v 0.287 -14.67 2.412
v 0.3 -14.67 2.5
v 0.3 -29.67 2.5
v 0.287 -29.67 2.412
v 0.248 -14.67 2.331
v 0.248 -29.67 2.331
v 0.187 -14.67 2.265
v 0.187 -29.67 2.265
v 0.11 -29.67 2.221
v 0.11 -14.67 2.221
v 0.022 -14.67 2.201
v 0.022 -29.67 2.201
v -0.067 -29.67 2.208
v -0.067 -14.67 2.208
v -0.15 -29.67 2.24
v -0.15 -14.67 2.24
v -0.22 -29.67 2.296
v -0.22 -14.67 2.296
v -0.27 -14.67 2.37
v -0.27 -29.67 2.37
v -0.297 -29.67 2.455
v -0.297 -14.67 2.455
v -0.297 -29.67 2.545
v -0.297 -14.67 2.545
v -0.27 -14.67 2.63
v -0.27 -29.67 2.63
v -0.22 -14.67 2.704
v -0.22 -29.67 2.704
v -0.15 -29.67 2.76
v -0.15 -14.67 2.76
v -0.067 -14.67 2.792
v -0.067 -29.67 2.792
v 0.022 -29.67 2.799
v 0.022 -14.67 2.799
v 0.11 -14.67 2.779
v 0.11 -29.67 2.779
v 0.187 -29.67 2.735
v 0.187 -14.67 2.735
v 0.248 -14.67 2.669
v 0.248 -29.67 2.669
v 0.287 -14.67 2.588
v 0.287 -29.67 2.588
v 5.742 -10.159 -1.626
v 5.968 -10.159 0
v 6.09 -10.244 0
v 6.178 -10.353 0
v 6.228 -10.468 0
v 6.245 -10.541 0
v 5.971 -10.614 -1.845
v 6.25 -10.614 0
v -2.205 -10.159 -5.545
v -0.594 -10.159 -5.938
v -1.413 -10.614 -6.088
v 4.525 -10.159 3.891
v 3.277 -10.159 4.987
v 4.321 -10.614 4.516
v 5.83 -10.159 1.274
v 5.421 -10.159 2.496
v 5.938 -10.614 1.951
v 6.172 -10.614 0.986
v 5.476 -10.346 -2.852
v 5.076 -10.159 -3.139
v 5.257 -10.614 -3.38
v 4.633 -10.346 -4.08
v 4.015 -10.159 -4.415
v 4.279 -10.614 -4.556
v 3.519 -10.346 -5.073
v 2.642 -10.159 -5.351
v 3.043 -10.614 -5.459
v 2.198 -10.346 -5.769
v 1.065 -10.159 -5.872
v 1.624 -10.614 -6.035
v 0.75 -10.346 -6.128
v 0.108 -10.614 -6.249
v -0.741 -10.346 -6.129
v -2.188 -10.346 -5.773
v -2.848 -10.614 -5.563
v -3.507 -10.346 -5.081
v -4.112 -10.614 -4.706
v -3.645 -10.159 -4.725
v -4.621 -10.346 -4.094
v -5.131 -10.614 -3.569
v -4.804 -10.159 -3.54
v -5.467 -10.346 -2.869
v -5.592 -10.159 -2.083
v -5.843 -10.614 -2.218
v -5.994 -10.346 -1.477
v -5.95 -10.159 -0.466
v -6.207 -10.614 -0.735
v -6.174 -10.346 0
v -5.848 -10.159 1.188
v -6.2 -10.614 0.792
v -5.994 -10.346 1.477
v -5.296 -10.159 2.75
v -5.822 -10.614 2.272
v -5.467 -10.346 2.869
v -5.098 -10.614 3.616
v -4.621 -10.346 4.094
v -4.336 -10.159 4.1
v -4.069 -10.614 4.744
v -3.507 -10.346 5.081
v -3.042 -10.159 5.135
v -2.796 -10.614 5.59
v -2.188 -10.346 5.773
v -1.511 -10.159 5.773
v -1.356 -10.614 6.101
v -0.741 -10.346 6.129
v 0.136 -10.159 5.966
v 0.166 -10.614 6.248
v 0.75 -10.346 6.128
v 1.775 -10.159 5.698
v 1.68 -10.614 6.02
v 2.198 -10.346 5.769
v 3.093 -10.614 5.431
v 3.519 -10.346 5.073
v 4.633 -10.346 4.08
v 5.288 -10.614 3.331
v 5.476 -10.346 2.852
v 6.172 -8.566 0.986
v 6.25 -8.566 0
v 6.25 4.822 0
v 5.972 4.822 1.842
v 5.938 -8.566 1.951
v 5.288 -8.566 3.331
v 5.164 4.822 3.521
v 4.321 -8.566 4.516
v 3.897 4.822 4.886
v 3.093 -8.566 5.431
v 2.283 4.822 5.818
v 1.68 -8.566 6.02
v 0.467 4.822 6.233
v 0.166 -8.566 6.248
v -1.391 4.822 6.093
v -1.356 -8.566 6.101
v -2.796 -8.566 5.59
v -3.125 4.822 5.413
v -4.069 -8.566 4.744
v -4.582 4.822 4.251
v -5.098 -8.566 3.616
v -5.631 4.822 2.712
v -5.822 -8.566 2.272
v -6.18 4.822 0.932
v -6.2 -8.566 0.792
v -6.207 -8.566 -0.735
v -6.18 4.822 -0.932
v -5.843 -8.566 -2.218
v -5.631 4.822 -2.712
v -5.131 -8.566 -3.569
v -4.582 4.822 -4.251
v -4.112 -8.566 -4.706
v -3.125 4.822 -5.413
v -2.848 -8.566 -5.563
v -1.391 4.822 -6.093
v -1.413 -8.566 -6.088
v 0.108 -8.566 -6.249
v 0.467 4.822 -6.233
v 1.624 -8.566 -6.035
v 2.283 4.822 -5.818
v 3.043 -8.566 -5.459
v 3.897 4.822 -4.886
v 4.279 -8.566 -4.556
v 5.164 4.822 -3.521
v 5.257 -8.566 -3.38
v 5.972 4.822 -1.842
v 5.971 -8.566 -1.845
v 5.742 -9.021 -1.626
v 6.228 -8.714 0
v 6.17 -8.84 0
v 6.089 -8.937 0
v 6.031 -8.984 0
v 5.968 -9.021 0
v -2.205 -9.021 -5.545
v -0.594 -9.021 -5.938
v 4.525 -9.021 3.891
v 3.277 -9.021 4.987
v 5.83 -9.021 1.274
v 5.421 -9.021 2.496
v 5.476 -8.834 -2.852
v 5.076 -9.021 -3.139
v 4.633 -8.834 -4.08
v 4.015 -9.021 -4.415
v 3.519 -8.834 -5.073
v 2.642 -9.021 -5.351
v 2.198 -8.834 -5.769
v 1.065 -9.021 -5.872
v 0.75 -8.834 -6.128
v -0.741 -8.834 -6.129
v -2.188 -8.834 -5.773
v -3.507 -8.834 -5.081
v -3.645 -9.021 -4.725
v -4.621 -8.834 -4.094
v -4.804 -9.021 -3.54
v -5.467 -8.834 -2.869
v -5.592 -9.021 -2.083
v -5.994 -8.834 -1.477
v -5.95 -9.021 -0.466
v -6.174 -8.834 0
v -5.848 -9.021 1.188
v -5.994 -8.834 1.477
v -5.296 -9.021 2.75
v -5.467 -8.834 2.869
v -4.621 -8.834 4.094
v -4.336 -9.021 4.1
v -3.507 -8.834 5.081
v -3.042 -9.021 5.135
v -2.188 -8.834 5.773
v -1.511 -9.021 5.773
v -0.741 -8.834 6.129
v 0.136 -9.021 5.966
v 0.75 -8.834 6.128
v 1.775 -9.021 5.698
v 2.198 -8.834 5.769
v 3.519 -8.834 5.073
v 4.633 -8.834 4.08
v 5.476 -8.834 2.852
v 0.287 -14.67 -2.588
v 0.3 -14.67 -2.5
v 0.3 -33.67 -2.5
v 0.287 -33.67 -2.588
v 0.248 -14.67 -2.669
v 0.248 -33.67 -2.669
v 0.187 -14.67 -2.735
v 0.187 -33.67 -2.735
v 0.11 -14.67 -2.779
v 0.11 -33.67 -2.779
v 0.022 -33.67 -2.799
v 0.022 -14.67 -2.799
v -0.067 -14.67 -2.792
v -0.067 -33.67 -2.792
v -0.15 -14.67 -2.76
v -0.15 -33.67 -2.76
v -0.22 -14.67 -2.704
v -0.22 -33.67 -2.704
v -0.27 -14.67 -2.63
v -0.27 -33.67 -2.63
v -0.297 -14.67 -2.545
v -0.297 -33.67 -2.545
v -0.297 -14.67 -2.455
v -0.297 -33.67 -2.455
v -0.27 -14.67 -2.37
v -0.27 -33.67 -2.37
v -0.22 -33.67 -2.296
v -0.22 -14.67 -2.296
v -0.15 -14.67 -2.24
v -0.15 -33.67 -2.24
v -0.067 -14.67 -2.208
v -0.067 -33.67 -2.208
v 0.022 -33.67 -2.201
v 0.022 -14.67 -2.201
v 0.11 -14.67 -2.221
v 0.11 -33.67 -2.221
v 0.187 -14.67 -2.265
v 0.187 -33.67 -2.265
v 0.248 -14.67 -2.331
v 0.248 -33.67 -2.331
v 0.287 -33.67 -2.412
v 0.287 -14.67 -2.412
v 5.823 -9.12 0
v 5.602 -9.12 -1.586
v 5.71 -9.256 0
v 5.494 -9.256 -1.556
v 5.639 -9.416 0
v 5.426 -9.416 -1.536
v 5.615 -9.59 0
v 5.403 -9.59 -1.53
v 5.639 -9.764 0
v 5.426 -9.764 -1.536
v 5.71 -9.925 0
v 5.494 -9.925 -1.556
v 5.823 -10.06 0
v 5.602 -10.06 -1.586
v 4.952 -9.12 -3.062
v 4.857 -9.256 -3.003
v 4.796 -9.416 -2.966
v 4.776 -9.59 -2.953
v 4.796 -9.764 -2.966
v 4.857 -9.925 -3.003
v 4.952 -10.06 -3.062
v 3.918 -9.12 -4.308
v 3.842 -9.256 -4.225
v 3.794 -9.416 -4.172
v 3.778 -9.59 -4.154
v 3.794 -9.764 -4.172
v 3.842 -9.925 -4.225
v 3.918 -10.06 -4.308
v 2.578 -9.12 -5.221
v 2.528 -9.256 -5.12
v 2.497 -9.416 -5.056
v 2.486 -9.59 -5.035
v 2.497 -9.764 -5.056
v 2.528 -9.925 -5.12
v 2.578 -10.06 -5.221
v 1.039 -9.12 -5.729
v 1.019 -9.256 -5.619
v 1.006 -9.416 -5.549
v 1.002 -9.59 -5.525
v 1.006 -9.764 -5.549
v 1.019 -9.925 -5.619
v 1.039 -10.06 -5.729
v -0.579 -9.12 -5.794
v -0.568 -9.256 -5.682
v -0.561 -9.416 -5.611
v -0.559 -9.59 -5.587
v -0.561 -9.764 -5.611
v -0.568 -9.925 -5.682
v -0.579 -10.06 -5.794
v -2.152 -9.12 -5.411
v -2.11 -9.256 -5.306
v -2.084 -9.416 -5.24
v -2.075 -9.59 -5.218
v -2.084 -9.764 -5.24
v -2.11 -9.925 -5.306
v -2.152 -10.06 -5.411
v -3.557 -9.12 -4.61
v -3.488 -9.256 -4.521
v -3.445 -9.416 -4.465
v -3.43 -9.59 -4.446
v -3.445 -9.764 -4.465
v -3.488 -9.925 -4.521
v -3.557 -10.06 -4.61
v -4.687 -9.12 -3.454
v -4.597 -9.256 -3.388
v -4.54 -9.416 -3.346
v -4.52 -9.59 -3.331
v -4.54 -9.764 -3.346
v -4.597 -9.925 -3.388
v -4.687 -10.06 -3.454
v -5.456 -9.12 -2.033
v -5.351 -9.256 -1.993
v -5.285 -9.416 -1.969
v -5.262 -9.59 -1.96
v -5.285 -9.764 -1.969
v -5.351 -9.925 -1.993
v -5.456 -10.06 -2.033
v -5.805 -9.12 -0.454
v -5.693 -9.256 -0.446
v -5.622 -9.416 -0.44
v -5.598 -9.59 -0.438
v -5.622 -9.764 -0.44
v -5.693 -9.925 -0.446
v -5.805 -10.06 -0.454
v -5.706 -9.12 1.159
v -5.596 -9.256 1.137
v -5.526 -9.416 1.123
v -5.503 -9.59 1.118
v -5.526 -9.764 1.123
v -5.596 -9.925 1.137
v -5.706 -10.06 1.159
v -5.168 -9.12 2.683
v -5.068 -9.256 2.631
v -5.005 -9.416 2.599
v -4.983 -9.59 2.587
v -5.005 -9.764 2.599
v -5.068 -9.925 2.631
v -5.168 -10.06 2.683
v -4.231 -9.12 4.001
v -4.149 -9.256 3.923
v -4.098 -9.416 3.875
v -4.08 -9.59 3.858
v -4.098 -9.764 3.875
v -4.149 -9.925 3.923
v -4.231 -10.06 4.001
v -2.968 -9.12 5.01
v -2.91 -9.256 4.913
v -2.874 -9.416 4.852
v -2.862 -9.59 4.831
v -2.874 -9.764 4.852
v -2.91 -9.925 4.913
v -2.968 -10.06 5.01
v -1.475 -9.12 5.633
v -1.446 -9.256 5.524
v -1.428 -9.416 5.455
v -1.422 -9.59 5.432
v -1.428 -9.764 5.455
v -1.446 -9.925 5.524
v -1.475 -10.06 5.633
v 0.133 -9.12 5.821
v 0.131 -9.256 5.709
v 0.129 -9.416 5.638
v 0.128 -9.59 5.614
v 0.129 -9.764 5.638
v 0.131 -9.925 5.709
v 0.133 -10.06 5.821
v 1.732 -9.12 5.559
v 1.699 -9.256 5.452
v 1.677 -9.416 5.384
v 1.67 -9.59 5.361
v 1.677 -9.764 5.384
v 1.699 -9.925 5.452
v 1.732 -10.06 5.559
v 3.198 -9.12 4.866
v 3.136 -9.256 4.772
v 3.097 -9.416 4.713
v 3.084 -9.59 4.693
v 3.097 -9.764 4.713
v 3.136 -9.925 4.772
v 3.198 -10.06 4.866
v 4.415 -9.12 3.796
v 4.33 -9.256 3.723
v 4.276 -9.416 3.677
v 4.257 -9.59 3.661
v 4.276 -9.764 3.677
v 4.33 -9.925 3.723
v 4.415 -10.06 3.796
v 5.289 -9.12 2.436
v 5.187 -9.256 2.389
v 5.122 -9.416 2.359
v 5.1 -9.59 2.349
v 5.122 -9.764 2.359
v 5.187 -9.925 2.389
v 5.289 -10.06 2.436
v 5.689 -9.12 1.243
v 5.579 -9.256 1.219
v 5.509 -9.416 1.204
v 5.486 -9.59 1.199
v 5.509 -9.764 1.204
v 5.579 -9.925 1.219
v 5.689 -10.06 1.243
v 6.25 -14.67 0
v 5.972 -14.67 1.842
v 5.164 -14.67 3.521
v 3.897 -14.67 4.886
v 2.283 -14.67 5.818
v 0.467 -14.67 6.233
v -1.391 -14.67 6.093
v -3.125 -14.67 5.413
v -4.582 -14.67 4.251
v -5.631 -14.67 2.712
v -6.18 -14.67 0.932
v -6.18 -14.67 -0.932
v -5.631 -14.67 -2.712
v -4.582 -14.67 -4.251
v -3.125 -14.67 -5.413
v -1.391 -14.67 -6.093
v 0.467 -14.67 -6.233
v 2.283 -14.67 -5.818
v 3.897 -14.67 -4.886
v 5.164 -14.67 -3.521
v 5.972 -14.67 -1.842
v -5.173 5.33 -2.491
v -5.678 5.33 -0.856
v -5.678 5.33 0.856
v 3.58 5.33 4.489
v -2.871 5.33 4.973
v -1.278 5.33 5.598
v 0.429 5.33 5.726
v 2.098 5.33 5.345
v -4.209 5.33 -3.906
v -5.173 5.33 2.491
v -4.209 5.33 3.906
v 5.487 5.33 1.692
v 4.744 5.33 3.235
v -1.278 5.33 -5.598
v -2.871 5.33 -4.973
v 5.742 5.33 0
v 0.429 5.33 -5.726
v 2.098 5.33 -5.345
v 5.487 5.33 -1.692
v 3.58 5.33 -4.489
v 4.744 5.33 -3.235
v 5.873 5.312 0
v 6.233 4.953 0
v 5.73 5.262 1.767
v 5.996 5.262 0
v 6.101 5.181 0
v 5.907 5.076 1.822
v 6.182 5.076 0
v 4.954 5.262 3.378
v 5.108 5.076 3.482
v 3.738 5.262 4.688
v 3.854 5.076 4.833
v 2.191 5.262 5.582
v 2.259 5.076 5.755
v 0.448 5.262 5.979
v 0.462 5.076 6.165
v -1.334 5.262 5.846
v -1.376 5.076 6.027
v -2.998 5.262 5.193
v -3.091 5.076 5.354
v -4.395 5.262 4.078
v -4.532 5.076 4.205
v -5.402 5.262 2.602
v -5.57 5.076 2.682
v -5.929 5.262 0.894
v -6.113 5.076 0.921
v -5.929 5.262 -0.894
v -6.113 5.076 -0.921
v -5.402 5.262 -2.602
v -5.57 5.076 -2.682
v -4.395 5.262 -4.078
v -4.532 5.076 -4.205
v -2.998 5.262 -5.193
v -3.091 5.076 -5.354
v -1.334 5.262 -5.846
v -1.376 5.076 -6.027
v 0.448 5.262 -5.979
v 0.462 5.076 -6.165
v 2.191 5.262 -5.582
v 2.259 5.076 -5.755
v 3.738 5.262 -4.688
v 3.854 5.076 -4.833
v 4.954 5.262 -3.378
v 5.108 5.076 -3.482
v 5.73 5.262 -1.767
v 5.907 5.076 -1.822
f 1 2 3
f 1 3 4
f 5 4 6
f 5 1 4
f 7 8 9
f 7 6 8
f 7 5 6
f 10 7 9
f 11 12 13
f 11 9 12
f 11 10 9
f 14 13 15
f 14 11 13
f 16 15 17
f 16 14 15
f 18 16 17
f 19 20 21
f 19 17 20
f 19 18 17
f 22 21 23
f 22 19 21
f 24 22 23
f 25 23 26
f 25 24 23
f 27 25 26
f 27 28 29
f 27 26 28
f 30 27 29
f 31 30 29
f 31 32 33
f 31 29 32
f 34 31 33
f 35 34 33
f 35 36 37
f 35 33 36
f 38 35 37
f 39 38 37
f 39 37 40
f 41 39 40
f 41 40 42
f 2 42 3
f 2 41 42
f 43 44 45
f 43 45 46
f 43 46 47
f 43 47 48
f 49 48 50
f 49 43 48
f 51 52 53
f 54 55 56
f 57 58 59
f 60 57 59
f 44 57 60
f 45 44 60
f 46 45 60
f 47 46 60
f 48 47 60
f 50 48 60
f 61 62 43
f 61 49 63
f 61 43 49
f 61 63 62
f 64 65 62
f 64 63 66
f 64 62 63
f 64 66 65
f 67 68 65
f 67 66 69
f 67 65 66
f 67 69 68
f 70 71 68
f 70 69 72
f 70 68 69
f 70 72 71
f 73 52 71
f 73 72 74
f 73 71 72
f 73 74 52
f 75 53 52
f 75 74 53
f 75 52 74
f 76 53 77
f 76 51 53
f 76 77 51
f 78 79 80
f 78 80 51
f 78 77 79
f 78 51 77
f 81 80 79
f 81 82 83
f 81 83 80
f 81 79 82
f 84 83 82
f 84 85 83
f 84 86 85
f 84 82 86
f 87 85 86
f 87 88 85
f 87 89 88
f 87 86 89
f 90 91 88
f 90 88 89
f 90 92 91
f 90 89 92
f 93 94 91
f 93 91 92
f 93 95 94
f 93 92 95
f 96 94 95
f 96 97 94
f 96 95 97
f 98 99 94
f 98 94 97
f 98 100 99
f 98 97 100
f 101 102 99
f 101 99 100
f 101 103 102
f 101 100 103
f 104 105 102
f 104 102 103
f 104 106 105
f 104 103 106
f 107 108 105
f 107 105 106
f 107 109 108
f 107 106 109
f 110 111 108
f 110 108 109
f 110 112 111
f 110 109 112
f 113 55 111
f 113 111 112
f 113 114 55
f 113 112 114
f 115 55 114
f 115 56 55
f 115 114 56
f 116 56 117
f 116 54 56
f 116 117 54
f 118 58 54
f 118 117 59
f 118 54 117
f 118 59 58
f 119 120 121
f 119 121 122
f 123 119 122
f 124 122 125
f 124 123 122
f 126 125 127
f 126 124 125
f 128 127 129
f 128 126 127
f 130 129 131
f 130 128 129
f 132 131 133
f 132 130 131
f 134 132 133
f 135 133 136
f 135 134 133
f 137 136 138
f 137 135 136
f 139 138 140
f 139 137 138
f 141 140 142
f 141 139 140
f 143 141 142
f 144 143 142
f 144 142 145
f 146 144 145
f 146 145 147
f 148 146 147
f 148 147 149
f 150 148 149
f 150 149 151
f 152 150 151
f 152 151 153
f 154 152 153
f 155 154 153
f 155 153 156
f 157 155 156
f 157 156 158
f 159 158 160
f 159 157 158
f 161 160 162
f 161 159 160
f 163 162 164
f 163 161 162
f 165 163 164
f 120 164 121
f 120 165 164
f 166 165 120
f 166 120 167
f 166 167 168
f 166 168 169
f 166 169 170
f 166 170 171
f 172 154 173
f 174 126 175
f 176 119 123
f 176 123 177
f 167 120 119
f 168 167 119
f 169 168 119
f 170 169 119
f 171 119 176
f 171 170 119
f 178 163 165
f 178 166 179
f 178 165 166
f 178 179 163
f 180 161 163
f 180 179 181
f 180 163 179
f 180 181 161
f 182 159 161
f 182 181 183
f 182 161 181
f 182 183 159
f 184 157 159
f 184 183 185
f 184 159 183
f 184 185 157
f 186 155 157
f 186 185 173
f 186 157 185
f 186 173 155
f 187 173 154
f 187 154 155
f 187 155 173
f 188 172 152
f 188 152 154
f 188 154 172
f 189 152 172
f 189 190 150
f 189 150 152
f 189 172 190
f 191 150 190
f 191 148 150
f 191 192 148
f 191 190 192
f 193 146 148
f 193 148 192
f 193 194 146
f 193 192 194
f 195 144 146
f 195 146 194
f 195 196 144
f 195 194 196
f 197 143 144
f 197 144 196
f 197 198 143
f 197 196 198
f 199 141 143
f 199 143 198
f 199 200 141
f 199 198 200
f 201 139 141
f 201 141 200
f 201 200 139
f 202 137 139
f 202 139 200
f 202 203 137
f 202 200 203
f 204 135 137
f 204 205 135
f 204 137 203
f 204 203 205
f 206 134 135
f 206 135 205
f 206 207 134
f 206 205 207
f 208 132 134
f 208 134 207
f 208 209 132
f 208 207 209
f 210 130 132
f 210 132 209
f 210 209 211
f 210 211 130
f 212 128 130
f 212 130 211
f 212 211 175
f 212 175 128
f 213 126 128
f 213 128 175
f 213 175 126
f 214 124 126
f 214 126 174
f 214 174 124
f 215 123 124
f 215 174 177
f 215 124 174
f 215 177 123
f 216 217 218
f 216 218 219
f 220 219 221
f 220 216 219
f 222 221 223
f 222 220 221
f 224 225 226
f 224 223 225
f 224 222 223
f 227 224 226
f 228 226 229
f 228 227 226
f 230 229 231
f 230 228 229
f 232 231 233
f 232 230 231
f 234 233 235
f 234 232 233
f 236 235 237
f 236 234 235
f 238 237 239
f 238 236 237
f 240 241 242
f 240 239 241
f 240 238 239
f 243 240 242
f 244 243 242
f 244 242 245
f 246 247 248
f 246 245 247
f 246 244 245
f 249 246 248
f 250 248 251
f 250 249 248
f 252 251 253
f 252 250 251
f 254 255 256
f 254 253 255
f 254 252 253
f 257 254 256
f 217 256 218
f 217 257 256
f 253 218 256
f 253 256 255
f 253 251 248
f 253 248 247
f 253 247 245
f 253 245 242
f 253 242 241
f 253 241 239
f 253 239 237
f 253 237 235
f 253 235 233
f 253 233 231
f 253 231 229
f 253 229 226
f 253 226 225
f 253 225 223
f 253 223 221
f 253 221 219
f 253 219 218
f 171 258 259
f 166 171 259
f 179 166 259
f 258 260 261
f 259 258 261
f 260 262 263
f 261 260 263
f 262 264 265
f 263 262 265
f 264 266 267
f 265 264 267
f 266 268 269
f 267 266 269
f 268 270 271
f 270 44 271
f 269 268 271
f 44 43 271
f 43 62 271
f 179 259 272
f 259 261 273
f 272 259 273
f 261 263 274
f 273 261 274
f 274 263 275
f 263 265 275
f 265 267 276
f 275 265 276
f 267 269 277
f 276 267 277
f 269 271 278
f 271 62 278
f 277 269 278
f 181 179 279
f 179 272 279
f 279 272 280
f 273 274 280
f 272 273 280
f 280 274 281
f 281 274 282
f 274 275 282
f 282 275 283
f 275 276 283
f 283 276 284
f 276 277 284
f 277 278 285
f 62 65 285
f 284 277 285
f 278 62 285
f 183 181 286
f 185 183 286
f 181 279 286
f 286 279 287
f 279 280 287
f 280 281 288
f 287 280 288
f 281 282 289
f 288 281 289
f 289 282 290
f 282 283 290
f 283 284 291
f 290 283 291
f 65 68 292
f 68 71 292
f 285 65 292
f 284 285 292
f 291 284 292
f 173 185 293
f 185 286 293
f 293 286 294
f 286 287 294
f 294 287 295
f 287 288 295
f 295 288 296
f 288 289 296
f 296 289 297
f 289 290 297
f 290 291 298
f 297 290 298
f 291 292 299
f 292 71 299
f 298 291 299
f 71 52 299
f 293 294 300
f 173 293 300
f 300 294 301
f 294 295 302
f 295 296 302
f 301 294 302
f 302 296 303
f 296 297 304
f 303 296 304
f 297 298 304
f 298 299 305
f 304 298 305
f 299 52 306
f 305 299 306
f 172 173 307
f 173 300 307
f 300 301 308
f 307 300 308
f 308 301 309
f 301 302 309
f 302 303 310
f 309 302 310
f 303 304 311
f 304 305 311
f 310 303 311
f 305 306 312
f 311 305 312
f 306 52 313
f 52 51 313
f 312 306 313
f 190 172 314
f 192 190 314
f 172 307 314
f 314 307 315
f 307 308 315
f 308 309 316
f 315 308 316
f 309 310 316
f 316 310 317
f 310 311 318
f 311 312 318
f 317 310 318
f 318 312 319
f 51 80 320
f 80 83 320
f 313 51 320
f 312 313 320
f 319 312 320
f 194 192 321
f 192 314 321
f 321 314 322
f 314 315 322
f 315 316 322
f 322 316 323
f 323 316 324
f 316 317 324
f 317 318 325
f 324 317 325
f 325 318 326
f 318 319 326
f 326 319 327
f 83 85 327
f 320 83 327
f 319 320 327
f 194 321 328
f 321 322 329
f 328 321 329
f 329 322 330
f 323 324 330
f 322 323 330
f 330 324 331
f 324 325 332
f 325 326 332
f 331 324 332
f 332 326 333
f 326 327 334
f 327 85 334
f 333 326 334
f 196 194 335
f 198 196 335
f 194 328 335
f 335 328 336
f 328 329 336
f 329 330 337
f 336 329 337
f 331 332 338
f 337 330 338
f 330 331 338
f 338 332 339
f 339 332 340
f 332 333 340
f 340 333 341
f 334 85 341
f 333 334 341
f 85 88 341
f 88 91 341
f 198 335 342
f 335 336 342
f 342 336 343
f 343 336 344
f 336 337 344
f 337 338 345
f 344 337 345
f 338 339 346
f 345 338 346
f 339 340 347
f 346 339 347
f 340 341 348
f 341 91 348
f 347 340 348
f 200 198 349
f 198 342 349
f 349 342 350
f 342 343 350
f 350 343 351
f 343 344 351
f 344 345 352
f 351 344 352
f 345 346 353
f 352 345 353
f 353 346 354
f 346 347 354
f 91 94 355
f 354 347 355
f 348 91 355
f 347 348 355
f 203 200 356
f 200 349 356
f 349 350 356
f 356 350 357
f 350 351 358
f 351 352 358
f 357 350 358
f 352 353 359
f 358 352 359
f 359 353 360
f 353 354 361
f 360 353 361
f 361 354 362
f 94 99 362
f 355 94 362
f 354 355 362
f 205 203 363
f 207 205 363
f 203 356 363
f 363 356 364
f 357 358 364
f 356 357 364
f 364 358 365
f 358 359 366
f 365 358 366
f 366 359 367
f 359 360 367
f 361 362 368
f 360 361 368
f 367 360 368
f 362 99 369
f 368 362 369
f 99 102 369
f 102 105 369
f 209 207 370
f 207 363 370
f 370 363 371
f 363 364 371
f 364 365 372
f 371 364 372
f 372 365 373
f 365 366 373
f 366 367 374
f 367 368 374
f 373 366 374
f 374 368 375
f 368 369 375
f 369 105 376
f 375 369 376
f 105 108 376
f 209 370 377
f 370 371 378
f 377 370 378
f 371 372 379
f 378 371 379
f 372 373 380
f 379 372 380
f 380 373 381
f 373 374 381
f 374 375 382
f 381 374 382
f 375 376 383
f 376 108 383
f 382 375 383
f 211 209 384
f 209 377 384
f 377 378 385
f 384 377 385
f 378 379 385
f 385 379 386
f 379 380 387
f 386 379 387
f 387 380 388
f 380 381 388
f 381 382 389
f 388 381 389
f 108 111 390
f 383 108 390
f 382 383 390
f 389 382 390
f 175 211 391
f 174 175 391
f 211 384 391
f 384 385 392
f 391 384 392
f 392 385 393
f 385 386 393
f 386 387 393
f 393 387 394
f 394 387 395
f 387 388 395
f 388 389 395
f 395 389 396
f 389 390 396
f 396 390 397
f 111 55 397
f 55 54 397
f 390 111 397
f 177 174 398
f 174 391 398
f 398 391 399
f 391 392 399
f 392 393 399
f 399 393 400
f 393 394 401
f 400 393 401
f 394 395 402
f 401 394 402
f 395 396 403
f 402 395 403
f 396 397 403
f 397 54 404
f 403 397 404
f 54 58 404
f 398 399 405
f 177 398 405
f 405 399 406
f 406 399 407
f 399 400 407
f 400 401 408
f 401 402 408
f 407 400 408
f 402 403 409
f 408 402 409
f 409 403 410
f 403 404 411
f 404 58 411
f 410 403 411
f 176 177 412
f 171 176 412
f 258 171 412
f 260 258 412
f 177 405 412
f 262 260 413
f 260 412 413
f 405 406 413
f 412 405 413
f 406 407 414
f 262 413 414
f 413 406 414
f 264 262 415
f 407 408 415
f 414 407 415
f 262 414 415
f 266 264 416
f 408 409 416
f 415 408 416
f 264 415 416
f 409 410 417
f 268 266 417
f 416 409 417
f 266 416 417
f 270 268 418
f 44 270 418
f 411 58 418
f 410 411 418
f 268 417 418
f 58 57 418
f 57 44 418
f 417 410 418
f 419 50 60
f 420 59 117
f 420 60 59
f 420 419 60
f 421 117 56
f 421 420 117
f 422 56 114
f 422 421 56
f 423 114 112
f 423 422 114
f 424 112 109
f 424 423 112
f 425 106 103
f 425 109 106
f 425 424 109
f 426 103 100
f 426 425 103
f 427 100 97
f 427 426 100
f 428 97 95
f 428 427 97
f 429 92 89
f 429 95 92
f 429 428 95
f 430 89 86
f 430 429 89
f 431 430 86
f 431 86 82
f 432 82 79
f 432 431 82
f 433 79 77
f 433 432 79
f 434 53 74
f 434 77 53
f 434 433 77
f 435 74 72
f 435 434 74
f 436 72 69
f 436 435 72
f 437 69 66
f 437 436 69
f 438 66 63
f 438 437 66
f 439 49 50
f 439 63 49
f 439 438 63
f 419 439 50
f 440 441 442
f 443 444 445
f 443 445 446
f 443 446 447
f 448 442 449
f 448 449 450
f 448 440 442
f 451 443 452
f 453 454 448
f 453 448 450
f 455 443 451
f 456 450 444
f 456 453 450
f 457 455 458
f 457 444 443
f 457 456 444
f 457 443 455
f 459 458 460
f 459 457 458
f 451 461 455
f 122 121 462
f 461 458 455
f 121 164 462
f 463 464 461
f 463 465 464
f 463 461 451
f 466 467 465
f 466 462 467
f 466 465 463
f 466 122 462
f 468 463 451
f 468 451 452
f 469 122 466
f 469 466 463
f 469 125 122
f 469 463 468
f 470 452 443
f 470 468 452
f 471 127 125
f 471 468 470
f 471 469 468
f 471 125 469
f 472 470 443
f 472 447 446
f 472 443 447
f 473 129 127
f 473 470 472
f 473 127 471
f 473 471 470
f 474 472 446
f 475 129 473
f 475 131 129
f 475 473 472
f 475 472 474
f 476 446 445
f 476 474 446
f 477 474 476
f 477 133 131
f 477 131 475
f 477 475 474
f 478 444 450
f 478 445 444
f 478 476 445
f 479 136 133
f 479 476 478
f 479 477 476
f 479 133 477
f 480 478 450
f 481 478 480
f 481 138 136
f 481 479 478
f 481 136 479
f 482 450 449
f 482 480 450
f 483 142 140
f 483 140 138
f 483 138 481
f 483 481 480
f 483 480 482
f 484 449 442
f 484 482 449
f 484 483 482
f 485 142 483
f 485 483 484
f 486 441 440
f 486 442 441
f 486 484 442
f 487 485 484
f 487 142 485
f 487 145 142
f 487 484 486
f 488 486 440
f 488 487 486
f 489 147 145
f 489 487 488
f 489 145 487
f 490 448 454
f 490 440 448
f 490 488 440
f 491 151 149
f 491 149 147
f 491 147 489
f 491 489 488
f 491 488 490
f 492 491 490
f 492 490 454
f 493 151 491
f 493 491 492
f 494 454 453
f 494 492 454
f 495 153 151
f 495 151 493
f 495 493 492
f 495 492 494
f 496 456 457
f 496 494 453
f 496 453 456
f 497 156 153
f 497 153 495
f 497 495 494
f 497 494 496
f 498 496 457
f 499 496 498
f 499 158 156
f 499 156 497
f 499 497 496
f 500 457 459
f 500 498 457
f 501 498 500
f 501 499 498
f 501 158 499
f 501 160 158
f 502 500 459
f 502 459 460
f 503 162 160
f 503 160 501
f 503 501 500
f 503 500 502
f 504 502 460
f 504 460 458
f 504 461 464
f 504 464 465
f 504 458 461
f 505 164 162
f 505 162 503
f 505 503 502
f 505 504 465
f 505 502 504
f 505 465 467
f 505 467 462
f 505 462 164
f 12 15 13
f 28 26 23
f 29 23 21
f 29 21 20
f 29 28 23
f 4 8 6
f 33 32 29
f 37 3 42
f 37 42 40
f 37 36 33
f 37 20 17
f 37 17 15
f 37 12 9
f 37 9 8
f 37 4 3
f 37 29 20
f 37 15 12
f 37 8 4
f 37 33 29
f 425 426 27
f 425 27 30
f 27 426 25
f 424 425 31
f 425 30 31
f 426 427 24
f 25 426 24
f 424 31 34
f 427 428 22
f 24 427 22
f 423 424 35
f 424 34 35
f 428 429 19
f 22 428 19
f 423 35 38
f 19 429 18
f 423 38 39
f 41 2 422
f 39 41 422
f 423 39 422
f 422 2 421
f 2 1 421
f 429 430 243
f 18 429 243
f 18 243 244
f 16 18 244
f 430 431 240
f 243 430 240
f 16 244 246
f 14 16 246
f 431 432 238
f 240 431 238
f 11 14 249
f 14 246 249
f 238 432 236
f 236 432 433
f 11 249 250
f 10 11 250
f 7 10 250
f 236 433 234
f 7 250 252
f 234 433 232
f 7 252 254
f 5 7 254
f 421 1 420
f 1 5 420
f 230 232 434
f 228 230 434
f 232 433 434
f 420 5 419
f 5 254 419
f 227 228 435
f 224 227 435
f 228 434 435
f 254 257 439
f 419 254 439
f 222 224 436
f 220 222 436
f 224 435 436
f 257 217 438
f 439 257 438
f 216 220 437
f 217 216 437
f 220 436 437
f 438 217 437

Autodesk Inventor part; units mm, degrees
ref_plane "YZ Plane" through (0, 0, 0) normal (1, 0, 0) x (0, 1, 0)
ref_plane "XZ Plane" through (0, 0, 0) normal (0, 1, 0) x (-1, 0, 0)
ref_plane "XY Plane" through (0, 0, 0) normal (0, 0, 1) x (1, 0, 0)
sketch "Sketch1" plane through (0, 0, 0) normal (0, 0, 1) x (1, 0, 0)
  line L0 (0, 5.3298) -> (6.25, 5.3298)
  line L1 (6.25, -14.6702) -> (0, -14.6702)
  line L2 (0, -14.6702) -> (0, 5.3298)
  circle A0 centre (6.25, -9.5902) radius 0.635
  line L3 (6.25, 5.3298) -> (6.25, -8.9552)
  line L4 (6.25, -10.2252) -> (6.25, -14.6702)
  point P0 (0, 0)
  dimension "d0" = 6.25
  dimension "d1" = 20
  dimension "d2" = 1.27
  dimension "d3" = 5.08
revolve "Revolution1" add sketch "Sketch1" angle 360 about axis through (0, -14.6702, 0) along (0, 1, 0) contours L0 L3 A0 L4 L1 L2
fillet "Fillet1" radius 0.508 3 edges at (-6.25, -10.2252, 0) (-6.25, -8.9552, 0) (-6.25, 5.3298, 0)
sketch "Sketch2" plane through (0, -14.6702, 0) normal (0, -1, 0) x (1, 0, 0)
  circle A0 centre (0, 2.5) radius 0.3
  circle A1 centre (0, -2.5) radius 0.3
  point P0 (0, 0)
  dimension "d6" = 0.6
  dimension "d7" = 0.6
  dimension "d8" = 2.5
  dimension "d9" = 2.5
extrude "Extrusion1" add sketch "Sketch2" along normal blind 15
sketch "Sketch3" plane through (0, -29.6702, -2.5) normal (0, -1, 0) x (1, 0, 0)
  circle A0 centre (0, 0) radius 0.3 projected
  point P0 (0, 2.5)
extrude "Extrusion2" add sketch "Sketch3" along normal blind 4
equation "\"d7\" = d6"
properties part number "CAP12.5X20" material "PC/ABS Plastic"
